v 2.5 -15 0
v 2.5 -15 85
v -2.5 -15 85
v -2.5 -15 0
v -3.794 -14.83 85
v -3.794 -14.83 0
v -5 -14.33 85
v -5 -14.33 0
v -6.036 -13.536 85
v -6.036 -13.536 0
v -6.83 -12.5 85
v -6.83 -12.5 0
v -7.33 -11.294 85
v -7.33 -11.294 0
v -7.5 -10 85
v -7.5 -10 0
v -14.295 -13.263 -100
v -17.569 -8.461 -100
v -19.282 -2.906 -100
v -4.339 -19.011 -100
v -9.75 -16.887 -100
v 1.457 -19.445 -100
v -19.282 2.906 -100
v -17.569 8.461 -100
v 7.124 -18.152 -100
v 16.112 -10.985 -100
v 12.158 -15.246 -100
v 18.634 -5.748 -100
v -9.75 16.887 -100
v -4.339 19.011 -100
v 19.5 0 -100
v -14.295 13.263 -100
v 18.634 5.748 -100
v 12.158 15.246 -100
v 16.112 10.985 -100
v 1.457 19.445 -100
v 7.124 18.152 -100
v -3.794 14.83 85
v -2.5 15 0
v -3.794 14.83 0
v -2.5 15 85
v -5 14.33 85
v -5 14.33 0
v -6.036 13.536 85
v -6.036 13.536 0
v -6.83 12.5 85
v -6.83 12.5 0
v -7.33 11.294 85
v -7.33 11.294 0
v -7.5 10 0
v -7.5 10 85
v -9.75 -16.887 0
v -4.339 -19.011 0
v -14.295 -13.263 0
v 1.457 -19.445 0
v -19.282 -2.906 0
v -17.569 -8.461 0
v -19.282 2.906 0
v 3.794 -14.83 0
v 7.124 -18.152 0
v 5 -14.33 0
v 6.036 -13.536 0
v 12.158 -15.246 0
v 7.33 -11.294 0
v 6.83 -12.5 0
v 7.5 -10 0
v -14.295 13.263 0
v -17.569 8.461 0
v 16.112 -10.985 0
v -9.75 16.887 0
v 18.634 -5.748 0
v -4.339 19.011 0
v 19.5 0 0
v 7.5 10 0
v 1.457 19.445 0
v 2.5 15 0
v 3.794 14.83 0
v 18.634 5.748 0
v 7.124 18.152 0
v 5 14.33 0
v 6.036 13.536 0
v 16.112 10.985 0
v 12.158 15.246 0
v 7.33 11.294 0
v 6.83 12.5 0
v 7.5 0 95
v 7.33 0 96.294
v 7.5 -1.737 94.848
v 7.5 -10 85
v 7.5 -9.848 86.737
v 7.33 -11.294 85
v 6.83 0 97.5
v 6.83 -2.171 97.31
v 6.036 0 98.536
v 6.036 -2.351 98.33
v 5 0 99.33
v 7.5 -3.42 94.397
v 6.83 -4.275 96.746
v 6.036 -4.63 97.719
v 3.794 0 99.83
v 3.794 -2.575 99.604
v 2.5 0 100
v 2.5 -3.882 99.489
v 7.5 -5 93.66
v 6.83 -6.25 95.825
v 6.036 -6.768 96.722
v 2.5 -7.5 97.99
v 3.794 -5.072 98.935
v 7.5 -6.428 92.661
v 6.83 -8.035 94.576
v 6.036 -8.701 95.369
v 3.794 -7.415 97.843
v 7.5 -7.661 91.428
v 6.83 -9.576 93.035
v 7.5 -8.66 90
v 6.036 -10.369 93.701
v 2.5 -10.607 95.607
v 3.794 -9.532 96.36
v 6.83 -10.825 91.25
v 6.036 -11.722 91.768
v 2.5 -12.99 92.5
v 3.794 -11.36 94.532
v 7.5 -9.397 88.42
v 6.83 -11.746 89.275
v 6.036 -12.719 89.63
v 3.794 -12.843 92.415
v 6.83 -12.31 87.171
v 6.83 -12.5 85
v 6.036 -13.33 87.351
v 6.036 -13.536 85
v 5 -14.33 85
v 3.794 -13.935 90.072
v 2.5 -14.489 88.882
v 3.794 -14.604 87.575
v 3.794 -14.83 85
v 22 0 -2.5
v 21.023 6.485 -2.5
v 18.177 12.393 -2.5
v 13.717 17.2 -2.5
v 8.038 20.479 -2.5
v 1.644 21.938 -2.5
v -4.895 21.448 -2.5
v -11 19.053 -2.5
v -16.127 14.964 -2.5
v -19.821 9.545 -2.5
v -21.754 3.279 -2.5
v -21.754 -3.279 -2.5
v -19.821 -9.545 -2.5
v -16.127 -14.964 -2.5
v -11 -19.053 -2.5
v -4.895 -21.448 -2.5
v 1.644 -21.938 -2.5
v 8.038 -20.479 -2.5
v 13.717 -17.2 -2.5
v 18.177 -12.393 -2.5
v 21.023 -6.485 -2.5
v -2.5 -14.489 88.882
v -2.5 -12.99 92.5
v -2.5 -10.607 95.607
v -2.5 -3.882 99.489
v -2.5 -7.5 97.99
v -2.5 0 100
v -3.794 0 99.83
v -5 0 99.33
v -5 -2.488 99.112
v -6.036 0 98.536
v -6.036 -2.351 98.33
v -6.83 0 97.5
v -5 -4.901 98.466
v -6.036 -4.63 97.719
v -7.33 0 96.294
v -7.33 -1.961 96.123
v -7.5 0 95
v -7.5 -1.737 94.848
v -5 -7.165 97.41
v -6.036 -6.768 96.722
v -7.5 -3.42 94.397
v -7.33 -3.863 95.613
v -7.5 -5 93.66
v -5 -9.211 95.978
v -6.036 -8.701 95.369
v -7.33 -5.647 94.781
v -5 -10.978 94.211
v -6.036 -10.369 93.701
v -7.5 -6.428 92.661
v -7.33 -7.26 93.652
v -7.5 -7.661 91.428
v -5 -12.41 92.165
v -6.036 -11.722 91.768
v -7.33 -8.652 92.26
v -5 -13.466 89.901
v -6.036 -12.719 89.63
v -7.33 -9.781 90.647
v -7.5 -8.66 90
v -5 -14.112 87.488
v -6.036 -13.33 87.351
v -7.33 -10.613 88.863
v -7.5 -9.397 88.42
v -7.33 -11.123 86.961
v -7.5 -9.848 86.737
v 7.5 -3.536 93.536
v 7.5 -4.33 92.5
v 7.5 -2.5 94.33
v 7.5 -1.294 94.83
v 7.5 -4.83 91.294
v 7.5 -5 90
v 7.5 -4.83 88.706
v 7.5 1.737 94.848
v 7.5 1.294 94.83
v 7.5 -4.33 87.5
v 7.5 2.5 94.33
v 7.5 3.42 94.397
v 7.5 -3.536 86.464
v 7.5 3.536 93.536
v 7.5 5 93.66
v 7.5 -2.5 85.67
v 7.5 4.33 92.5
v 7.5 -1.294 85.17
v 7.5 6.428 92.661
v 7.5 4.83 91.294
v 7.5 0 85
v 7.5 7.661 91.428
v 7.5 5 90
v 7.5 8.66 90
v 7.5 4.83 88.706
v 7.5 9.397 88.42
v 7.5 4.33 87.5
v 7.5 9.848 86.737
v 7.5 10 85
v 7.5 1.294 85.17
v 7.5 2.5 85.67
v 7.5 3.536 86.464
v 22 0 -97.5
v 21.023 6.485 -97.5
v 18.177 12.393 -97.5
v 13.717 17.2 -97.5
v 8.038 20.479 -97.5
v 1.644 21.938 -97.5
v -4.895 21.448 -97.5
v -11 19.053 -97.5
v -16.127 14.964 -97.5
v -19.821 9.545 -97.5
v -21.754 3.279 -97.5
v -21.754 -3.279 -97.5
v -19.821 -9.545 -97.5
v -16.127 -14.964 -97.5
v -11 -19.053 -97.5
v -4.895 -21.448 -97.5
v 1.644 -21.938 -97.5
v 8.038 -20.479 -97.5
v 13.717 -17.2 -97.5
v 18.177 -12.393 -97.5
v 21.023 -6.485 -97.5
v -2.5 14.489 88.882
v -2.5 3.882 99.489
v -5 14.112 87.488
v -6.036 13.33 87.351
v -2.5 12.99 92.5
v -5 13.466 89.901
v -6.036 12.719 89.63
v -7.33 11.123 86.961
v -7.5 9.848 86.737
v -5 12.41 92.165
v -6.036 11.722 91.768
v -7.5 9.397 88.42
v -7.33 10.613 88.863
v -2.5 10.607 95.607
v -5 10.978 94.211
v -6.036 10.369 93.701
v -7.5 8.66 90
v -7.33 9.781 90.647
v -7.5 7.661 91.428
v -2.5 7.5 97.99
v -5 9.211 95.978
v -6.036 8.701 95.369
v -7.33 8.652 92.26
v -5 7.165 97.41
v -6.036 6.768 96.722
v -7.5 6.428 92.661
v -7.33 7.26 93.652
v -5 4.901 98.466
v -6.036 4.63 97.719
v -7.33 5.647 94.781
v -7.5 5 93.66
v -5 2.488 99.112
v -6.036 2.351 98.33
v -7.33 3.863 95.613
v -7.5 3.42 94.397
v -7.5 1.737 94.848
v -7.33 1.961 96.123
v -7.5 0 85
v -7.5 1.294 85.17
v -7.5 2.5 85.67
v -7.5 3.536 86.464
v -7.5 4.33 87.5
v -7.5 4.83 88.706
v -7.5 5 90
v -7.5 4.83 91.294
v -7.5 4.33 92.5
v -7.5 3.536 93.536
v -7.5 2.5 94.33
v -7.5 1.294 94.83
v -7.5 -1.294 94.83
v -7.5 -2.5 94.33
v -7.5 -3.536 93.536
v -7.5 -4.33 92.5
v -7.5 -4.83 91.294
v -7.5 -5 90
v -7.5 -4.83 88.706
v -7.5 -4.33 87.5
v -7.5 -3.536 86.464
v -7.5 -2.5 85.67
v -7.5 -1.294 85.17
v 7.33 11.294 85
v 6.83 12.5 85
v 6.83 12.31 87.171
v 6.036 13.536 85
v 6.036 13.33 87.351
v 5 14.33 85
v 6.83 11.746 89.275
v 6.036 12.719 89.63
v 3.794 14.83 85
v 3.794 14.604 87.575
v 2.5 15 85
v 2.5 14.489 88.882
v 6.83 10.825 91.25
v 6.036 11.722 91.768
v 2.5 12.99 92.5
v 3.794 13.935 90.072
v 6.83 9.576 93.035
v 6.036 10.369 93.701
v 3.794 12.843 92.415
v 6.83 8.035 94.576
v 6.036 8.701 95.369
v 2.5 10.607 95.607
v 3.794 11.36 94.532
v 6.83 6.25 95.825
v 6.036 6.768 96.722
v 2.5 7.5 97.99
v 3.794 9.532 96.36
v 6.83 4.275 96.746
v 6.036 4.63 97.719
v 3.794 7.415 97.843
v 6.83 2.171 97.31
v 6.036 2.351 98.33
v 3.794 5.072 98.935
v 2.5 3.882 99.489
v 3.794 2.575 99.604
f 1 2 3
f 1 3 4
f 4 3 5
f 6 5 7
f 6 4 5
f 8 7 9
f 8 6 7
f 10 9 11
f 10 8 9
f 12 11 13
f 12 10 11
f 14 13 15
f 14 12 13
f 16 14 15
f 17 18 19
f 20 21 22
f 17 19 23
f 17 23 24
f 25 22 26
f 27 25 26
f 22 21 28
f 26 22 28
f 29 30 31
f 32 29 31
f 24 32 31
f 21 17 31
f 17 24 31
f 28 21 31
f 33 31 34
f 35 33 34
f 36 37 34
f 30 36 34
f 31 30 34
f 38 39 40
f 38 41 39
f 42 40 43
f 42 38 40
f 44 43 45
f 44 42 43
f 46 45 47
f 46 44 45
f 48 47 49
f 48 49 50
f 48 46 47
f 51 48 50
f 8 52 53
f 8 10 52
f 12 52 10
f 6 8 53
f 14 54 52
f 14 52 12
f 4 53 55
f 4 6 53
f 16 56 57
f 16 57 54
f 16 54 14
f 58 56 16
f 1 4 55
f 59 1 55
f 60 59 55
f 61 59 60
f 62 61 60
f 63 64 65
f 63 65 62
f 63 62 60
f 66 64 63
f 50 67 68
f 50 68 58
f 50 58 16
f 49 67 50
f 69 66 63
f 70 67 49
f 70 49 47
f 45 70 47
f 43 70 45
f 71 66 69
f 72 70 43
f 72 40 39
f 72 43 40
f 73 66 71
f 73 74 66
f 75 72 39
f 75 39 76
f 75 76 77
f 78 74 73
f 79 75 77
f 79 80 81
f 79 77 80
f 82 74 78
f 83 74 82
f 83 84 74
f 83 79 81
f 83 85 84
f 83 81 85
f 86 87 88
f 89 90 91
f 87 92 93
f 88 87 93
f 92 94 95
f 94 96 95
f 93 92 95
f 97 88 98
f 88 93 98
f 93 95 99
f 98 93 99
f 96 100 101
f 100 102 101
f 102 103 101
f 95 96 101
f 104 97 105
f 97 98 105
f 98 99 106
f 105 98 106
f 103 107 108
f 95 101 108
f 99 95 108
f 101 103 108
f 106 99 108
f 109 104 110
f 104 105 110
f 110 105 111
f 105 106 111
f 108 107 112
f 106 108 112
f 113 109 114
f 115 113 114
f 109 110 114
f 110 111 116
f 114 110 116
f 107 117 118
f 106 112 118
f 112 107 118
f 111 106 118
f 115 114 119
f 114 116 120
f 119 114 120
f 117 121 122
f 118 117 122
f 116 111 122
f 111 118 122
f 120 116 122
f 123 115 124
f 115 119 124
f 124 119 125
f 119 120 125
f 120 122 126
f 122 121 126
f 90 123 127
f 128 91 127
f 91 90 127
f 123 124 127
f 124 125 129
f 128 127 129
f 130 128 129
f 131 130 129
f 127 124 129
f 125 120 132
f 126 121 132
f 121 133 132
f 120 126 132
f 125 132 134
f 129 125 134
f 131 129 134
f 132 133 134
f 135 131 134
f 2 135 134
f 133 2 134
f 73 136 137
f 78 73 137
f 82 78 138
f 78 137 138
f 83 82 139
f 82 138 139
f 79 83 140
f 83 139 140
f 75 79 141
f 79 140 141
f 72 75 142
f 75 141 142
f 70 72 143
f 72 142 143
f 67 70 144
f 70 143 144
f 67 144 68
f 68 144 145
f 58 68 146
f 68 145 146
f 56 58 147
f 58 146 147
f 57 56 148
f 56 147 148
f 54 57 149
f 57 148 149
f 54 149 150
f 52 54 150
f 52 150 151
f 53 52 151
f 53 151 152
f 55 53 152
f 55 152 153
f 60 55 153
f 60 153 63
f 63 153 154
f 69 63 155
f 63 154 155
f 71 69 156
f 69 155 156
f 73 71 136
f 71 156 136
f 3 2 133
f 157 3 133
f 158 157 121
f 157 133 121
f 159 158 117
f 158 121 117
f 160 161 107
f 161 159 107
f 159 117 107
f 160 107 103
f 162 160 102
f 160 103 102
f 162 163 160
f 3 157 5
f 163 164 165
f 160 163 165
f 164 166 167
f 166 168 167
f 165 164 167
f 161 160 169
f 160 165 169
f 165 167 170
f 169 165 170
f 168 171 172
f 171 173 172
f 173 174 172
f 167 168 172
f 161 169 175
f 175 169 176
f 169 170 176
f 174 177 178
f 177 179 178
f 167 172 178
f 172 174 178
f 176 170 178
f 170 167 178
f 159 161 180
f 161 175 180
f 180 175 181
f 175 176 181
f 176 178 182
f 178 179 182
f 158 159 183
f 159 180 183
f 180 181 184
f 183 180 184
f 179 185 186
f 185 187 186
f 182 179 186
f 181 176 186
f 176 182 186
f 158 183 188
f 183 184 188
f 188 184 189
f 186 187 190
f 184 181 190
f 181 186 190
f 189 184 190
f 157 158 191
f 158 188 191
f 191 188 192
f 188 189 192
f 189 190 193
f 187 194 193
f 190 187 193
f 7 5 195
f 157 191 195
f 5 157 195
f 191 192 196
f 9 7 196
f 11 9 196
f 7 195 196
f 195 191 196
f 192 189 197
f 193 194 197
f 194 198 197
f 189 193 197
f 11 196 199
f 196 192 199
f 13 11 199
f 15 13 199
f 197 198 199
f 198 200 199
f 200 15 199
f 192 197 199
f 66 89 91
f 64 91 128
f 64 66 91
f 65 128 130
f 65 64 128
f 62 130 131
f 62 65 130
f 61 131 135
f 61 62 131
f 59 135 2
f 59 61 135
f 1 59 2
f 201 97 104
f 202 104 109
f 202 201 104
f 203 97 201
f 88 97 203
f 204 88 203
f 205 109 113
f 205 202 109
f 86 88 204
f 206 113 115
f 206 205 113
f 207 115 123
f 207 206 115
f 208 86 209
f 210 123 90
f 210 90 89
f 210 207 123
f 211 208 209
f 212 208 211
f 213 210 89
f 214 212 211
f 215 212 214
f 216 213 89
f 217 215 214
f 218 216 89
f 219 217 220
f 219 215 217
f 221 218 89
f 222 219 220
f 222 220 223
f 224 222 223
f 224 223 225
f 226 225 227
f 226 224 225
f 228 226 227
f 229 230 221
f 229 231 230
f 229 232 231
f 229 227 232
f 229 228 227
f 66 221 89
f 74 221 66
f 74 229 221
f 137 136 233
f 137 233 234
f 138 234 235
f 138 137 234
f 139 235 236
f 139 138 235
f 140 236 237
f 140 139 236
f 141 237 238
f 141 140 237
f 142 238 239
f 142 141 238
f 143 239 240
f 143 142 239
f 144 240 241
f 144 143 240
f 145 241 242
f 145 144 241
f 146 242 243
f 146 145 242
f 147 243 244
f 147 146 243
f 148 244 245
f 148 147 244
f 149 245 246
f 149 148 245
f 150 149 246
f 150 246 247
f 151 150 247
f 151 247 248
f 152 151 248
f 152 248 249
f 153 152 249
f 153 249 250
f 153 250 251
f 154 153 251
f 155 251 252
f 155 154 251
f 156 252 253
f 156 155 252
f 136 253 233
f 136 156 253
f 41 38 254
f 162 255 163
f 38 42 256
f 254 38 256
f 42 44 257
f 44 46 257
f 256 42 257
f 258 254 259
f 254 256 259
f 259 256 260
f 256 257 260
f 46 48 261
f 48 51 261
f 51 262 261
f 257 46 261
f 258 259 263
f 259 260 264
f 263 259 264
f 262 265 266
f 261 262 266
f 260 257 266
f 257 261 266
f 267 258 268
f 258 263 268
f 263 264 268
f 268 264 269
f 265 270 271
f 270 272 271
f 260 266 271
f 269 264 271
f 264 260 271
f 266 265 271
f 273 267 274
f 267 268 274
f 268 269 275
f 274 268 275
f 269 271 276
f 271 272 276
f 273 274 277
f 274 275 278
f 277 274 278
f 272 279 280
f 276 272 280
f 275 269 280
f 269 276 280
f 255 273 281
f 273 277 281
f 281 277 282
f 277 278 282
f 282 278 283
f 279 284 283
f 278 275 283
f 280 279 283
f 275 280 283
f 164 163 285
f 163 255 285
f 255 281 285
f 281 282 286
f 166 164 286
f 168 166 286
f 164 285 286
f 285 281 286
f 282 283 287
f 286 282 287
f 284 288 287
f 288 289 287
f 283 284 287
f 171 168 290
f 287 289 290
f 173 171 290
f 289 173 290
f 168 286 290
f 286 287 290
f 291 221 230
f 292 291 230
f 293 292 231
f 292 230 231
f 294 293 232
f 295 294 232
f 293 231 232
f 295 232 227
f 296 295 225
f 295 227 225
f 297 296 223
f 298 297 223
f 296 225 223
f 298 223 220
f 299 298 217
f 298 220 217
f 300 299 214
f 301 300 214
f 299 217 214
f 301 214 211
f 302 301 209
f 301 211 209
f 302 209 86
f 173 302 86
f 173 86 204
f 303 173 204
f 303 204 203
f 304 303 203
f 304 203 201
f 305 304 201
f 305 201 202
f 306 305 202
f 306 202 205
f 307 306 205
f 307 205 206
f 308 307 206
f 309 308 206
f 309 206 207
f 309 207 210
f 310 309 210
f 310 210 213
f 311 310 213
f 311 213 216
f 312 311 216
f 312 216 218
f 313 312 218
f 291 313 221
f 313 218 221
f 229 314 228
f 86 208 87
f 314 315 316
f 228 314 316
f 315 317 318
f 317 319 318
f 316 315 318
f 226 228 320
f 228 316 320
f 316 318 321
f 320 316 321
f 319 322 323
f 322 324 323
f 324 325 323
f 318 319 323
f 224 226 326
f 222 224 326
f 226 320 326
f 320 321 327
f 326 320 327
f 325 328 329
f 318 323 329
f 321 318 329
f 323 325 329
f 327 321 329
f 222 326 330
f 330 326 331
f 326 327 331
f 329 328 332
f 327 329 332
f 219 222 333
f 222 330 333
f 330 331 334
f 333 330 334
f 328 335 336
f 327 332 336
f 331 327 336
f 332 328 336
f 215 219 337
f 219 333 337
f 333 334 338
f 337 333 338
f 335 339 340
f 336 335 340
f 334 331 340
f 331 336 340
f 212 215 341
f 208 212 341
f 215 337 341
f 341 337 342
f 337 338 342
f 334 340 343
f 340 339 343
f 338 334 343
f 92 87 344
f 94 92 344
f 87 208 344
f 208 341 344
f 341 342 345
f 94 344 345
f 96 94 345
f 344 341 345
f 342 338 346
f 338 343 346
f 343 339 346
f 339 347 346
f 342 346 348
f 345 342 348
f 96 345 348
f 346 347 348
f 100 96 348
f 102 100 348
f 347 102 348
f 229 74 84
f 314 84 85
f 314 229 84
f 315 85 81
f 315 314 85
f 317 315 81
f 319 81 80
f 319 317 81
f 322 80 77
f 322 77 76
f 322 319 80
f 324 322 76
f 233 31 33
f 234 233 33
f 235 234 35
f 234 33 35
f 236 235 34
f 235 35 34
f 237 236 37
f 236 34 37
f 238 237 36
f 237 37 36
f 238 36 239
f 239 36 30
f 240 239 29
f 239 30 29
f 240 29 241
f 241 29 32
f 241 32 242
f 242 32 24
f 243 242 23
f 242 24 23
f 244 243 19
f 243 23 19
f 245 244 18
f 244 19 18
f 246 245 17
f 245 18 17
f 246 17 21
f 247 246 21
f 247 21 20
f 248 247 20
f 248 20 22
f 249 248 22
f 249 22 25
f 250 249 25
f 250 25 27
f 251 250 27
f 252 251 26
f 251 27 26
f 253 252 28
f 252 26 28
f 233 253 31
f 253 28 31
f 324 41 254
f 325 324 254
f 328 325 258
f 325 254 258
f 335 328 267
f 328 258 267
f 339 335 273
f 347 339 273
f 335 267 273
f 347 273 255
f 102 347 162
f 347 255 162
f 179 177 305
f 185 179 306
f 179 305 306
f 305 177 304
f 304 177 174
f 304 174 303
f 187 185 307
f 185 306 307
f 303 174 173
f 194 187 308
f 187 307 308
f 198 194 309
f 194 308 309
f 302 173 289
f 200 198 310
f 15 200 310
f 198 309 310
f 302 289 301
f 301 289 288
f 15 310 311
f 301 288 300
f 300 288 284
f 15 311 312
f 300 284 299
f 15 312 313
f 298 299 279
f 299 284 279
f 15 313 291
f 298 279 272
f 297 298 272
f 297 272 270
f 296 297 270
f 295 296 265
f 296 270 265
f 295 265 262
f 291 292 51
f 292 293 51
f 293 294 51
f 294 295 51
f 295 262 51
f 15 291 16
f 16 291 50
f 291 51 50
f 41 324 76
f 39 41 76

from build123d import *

# Parameters (mm, degrees)
SKETCH2_R           = 22
BOSS_EXTRUDE1_DEPTH = 100
SKETCH4_W           = 100
SKETCH4_H           = 30
BOSS_EXTRUDE2_DEPTH = 7.5
FILLET1_R           = 15
SKETCH5_R           = 5
CUT_EXTRUDE1_DEPTH  = 107.556323135
FILLET2_R           = 5
CHAMFER1_SIZE       = 2.5


with BuildPart() as part:
    # Sketch2 → Boss-Extrude1 (new body)
    with BuildSketch(Plane.XY):
        Circle(SKETCH2_R)
    extrude(amount=-BOSS_EXTRUDE1_DEPTH)

    # Sketch4 → Boss-Extrude2 (add, symmetric)
    with BuildSketch(Plane(origin=(0, 0, 0), x_dir=(0, 0, -1), z_dir=(1, 0, 0))):
        with Locations((-50, 0)):
            Rectangle(SKETCH4_W, SKETCH4_H)
    extrude(amount=BOSS_EXTRUDE2_DEPTH, both=True)

    # Fillet1
    fillet1_edges = [part.edges().sort_by_distance(p)[0] for p in [
        (0, -15, 100),
        (0, 15, 100),
    ]]
    fillet(fillet1_edges, radius=FILLET1_R - 0.0001)  # a hair under: the kernel refuses the full size

    # Sketch5 → Cut-Extrude1 (cut, through all)
    with BuildSketch(Plane(origin=(7.5, 0, 0), x_dir=(0, 0, -1), z_dir=(1, 0, 0))):
        with Locations((-90, 0)):
            Circle(SKETCH5_R)
    extrude(amount=-CUT_EXTRUDE1_DEPTH, mode=Mode.SUBTRACT)

    # Fillet2
    fillet2_edges = [part.edges().sort_by_distance(p)[0] for p in [
        (-7.5, -15, 42.50005),
        (7.5, -15, 42.50005),
        (-7.5, 10.606631007, 95.606631007),
        (-7.5, -10.606631007, 95.606631007),
        (7.5, 10.606631007, 95.606631007),
        (7.5, -10.606631007, 95.606631007),
        (-7.5, 15, 42.50005),
        (7.5, 15, 42.50005),
    ]]
    fillet(fillet2_edges, radius=FILLET2_R - 0.0001)  # a hair under: the kernel refuses the full size

    # Chamfer1
    chamfer1_edges = [part.edges().sort_by_distance(p)[0] for p in [
        (-22, 0, 0),
        (-22, 0, -100),
    ]]
    chamfer(chamfer1_edges, length=CHAMFER1_SIZE)


solid = part.part
